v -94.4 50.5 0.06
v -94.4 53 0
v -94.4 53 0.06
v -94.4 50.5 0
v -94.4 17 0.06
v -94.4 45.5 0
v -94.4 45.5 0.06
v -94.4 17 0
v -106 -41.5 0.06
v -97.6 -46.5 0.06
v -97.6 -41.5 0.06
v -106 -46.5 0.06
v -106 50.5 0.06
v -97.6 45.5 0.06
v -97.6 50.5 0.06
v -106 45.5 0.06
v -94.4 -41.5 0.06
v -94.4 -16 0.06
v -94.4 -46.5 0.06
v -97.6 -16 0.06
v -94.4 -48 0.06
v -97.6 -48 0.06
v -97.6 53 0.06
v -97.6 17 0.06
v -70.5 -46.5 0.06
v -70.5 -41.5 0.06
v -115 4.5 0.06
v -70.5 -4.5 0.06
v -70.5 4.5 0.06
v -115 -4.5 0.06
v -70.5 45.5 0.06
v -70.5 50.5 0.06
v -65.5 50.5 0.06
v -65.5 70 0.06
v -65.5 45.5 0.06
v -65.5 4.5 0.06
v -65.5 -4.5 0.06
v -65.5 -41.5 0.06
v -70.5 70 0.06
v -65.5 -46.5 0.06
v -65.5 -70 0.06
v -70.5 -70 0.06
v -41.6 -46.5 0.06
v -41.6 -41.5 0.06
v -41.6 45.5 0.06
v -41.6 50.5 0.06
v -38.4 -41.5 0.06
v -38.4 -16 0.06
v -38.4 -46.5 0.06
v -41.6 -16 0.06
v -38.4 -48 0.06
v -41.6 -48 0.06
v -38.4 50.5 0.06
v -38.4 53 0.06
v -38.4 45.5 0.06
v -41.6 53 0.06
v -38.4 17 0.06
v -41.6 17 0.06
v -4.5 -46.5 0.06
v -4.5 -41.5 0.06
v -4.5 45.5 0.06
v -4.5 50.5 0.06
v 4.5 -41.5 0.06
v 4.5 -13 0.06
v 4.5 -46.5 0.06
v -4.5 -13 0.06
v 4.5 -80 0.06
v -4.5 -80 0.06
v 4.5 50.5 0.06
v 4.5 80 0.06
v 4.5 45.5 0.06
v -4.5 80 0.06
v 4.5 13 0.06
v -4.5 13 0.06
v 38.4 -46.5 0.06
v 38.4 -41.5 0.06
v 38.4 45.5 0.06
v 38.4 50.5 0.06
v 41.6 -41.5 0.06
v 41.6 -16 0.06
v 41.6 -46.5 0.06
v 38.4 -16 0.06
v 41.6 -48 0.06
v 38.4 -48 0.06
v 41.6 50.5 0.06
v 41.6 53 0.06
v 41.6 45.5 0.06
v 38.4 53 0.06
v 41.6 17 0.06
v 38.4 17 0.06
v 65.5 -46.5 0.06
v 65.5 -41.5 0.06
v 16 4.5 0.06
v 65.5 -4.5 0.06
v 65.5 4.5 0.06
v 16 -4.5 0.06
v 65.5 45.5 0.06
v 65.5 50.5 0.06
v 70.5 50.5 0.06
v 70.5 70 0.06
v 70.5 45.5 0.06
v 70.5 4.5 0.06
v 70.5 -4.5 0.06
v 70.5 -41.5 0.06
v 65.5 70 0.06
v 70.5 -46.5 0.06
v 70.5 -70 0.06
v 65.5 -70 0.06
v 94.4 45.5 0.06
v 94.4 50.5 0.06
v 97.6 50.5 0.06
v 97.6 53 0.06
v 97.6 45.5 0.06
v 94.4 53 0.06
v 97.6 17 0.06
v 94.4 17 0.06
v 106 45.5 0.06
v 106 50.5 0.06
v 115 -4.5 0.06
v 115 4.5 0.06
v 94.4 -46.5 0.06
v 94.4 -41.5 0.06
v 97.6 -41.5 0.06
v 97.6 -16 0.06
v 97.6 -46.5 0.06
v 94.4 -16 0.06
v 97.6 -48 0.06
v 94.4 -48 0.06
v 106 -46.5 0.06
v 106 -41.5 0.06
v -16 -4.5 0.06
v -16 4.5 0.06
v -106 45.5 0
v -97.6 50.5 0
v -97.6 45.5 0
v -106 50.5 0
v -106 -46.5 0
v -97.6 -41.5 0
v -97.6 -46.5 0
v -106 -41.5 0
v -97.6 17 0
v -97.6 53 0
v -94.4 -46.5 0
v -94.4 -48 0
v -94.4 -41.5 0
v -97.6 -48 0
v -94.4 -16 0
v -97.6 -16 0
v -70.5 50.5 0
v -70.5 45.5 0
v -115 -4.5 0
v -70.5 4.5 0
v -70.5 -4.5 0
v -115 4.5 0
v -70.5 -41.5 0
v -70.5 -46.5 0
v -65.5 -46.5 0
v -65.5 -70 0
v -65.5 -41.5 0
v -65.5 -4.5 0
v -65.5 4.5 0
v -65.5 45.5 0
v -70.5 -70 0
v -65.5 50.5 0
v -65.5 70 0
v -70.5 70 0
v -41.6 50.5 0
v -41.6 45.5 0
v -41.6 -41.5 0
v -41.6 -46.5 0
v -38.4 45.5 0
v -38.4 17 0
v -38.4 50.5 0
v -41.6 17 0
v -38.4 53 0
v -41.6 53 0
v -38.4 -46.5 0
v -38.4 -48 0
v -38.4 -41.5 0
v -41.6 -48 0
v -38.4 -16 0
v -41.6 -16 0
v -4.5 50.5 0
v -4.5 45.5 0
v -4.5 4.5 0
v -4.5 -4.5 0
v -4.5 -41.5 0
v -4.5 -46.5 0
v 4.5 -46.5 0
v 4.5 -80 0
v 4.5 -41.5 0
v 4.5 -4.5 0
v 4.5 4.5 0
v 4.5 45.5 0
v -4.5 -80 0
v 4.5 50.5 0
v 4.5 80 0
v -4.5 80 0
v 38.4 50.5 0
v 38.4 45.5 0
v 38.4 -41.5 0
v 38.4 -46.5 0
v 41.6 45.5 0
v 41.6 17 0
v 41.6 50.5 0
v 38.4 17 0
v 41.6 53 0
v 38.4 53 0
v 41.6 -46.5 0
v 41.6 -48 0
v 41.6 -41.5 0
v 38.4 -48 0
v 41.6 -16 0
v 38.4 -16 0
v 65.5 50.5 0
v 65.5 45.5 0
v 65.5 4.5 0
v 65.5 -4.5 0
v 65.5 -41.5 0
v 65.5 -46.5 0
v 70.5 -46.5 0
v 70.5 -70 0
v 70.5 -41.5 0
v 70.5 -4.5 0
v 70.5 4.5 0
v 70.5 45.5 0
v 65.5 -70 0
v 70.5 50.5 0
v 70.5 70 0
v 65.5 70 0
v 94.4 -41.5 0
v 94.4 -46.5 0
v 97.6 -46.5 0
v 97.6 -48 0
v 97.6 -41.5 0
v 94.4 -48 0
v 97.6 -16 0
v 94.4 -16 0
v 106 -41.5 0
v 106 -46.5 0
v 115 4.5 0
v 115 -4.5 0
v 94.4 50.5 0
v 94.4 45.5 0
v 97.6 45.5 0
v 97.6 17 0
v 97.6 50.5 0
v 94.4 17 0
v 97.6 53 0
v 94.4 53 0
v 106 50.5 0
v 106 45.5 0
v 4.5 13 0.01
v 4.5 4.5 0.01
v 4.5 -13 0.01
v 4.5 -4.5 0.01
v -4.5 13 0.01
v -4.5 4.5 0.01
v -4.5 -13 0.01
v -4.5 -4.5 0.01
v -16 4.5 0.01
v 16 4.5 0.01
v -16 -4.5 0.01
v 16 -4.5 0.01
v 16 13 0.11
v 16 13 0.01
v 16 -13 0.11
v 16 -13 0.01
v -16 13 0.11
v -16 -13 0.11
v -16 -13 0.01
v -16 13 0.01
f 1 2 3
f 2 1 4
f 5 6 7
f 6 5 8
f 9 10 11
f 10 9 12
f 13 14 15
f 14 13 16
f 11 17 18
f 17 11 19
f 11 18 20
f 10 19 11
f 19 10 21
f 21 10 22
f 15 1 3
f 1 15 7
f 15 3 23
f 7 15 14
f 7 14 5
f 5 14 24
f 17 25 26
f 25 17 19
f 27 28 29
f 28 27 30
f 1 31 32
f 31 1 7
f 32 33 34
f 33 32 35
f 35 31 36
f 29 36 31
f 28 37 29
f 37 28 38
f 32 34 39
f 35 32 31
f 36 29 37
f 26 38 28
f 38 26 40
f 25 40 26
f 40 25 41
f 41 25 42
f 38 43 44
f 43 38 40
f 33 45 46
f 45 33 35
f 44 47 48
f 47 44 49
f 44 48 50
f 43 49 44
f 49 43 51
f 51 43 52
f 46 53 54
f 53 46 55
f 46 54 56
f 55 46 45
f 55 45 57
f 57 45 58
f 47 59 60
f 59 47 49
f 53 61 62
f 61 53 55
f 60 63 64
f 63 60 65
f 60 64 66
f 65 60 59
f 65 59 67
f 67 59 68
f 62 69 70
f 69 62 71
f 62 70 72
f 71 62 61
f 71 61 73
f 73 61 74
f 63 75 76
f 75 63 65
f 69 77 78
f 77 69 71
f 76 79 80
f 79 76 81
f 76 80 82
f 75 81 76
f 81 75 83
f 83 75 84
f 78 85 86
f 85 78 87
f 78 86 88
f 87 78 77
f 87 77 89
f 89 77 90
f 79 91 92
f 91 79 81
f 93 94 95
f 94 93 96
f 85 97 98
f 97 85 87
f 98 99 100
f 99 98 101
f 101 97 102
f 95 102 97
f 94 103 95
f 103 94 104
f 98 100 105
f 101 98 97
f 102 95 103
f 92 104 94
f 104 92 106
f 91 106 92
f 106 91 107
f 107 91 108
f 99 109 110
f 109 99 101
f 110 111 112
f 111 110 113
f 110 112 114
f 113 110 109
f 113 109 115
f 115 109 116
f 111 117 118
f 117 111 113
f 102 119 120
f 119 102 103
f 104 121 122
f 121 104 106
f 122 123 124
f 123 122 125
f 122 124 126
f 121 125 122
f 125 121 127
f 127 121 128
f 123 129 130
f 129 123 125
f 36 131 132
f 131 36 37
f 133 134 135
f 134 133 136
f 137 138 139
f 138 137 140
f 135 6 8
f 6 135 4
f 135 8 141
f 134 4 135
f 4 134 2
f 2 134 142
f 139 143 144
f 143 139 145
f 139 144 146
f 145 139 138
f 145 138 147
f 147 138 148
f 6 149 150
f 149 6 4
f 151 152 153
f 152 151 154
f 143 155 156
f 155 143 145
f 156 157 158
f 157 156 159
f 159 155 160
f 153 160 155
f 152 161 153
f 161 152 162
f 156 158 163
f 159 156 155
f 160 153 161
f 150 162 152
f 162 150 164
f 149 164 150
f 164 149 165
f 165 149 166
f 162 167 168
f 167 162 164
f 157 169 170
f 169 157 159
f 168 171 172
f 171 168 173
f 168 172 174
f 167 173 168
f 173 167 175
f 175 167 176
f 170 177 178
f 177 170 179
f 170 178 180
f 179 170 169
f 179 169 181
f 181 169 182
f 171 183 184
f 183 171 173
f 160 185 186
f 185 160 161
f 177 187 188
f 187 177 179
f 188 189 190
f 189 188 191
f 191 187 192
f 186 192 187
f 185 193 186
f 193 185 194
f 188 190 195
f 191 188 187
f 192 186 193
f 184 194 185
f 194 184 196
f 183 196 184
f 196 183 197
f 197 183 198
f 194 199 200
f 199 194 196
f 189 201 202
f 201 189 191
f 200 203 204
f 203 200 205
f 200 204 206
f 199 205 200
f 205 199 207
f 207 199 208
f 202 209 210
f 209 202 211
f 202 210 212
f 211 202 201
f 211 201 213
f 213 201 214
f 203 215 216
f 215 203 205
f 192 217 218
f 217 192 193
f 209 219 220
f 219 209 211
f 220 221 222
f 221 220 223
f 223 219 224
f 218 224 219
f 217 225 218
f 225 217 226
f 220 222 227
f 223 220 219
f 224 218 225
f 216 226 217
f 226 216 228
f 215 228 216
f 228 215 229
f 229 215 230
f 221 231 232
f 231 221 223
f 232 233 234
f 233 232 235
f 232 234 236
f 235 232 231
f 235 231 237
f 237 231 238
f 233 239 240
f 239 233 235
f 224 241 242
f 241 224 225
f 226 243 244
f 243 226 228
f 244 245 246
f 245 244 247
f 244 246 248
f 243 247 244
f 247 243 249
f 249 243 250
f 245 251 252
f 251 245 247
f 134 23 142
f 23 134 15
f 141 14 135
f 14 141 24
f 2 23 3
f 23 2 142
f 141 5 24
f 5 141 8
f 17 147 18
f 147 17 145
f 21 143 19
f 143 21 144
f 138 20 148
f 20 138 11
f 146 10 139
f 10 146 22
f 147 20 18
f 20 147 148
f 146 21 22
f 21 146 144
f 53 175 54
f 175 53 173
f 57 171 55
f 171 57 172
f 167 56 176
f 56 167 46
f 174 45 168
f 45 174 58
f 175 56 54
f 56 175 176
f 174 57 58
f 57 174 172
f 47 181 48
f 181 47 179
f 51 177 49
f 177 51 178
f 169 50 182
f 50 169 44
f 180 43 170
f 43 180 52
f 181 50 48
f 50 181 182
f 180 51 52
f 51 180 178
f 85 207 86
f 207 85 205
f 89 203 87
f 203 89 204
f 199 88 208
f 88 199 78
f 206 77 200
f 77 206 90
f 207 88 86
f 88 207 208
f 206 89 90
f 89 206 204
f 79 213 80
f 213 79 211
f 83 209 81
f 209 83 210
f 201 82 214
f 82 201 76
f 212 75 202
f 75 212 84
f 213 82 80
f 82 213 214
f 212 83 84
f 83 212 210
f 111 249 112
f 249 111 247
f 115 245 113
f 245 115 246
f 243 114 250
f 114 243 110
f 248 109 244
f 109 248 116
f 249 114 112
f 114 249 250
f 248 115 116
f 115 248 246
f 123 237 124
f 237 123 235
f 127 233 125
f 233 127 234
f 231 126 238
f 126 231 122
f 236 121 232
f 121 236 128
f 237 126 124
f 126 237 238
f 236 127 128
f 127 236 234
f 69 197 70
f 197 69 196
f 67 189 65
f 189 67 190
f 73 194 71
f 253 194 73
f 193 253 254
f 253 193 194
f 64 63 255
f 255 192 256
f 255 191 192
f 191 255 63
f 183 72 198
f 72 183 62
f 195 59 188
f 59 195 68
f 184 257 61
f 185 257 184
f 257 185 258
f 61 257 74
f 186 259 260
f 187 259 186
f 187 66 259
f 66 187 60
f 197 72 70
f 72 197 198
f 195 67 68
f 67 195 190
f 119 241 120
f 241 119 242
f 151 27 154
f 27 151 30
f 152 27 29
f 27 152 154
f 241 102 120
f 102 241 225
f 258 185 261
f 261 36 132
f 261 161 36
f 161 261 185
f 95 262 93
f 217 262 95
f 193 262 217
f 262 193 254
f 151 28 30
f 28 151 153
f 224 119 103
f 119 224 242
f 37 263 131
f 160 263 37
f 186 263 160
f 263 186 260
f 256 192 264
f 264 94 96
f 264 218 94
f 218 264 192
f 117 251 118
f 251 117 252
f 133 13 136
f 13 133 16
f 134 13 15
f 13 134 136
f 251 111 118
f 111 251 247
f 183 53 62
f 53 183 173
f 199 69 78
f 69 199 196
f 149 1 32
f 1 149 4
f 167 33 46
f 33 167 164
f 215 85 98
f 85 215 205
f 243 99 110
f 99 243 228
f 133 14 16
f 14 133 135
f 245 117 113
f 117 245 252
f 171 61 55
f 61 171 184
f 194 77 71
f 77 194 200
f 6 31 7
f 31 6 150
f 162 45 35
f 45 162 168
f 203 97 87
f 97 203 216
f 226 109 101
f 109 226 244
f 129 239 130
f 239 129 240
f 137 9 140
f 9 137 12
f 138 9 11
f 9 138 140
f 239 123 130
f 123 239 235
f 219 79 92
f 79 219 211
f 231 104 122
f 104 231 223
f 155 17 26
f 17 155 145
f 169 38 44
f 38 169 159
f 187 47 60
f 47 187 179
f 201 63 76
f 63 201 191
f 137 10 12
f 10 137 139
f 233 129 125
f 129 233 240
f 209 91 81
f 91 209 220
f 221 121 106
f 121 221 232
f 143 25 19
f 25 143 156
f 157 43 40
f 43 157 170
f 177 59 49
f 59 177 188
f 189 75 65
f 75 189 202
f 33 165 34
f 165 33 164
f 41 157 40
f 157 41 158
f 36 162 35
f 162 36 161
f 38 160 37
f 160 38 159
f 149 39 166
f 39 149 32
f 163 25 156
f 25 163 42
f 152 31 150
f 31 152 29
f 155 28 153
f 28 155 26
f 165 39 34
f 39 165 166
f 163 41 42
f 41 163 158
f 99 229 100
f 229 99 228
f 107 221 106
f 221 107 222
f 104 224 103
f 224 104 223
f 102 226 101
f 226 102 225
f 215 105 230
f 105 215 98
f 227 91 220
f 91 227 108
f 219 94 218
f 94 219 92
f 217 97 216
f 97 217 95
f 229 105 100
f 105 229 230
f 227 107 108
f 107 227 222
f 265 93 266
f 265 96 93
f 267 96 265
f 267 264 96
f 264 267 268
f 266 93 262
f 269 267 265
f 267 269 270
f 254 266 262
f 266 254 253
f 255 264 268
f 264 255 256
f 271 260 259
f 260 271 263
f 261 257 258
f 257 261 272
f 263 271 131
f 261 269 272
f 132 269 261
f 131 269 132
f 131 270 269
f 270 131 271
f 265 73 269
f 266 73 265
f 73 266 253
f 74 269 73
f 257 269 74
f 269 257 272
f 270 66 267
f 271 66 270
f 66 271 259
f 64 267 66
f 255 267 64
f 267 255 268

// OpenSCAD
// file: common.scad
// ============================================================
// Ancient Chinese City - shared parameters and primitive helpers
// ============================================================

function city_w() = 260;
function city_h() = 190;

function wall_t() = 14;
function wall_h() = 15;
function parapet_h() = 2.4;

function gate_w() = 28;

function main_road_w() = 9;
function side_road_w() = 5;

function c_ground()     = [0.60, 0.73, 0.48];
function c_road()       = [0.60, 0.54, 0.42];
function c_stone()      = [0.53, 0.50, 0.45];
function c_stone_dark() = [0.36, 0.34, 0.31];
function c_stone_lite() = [0.70, 0.66, 0.58];
function c_walkway()    = [0.64, 0.61, 0.54];

function c_wood()       = [0.42, 0.22, 0.10];
function c_wood_dark()  = [0.22, 0.11, 0.05];
function c_plaster()    = [0.84, 0.79, 0.67];

function c_roof()       = [0.55, 0.10, 0.06];
function c_roof_dark()  = [0.26, 0.06, 0.035];

function c_lantern()    = [0.86, 0.16, 0.08];
function c_flag()       = [0.72, 0.08, 0.06];
function c_green()      = [0.18, 0.42, 0.14];
function c_water()      = [0.28, 0.46, 0.60];

module boxc(s) {
    cube(s, center=true);
}

module stepped_base(L=20, D=16, H1=0.8, H2=0.5) {
    color(c_stone_dark())
    translate([0,0,H1/2])
    boxc([L,D,H1]);

    color(c_stone_lite())
    translate([0,0,H1+H2/2])
    boxc([L-1.4,D-1.4,H2]);
}

// Standalone preview.
stepped_base();
// main file
// ============================================================
// Ancient Chinese City - roads
// ============================================================

$fn = 32;

use <common.scad>

module road_x(L,W) {
    color(c_road())
    translate([0,0,0.03])
    boxc([L,W,0.06]);
}

module road_y(L,W) {
    color(c_road())
    translate([0,0,0.03])
    boxc([W,L,0.06]);
}

module inner_roads() {
    road_y(city_h()-30, main_road_w());
    road_x(city_w()-30, main_road_w());

    translate([0, 48, 0]) road_x(city_w()-48, side_road_w());
    translate([0,-44, 0]) road_x(city_w()-48, side_road_w());

    translate([-68,0,0]) road_y(city_h()-50, side_road_w());
    translate([ 68,0,0]) road_y(city_h()-50, side_road_w());

    for (x=[-96,-40,40,96]) {
        translate([x,35,0]) road_y(36,3.2);
        translate([x,-32,0]) road_y(32,3.2);
    }

    color([0.66,0.59,0.47])
    translate([0,0,0.06])
    boxc([32,26,0.1]);
}

// Standalone preview.
inner_roads();
